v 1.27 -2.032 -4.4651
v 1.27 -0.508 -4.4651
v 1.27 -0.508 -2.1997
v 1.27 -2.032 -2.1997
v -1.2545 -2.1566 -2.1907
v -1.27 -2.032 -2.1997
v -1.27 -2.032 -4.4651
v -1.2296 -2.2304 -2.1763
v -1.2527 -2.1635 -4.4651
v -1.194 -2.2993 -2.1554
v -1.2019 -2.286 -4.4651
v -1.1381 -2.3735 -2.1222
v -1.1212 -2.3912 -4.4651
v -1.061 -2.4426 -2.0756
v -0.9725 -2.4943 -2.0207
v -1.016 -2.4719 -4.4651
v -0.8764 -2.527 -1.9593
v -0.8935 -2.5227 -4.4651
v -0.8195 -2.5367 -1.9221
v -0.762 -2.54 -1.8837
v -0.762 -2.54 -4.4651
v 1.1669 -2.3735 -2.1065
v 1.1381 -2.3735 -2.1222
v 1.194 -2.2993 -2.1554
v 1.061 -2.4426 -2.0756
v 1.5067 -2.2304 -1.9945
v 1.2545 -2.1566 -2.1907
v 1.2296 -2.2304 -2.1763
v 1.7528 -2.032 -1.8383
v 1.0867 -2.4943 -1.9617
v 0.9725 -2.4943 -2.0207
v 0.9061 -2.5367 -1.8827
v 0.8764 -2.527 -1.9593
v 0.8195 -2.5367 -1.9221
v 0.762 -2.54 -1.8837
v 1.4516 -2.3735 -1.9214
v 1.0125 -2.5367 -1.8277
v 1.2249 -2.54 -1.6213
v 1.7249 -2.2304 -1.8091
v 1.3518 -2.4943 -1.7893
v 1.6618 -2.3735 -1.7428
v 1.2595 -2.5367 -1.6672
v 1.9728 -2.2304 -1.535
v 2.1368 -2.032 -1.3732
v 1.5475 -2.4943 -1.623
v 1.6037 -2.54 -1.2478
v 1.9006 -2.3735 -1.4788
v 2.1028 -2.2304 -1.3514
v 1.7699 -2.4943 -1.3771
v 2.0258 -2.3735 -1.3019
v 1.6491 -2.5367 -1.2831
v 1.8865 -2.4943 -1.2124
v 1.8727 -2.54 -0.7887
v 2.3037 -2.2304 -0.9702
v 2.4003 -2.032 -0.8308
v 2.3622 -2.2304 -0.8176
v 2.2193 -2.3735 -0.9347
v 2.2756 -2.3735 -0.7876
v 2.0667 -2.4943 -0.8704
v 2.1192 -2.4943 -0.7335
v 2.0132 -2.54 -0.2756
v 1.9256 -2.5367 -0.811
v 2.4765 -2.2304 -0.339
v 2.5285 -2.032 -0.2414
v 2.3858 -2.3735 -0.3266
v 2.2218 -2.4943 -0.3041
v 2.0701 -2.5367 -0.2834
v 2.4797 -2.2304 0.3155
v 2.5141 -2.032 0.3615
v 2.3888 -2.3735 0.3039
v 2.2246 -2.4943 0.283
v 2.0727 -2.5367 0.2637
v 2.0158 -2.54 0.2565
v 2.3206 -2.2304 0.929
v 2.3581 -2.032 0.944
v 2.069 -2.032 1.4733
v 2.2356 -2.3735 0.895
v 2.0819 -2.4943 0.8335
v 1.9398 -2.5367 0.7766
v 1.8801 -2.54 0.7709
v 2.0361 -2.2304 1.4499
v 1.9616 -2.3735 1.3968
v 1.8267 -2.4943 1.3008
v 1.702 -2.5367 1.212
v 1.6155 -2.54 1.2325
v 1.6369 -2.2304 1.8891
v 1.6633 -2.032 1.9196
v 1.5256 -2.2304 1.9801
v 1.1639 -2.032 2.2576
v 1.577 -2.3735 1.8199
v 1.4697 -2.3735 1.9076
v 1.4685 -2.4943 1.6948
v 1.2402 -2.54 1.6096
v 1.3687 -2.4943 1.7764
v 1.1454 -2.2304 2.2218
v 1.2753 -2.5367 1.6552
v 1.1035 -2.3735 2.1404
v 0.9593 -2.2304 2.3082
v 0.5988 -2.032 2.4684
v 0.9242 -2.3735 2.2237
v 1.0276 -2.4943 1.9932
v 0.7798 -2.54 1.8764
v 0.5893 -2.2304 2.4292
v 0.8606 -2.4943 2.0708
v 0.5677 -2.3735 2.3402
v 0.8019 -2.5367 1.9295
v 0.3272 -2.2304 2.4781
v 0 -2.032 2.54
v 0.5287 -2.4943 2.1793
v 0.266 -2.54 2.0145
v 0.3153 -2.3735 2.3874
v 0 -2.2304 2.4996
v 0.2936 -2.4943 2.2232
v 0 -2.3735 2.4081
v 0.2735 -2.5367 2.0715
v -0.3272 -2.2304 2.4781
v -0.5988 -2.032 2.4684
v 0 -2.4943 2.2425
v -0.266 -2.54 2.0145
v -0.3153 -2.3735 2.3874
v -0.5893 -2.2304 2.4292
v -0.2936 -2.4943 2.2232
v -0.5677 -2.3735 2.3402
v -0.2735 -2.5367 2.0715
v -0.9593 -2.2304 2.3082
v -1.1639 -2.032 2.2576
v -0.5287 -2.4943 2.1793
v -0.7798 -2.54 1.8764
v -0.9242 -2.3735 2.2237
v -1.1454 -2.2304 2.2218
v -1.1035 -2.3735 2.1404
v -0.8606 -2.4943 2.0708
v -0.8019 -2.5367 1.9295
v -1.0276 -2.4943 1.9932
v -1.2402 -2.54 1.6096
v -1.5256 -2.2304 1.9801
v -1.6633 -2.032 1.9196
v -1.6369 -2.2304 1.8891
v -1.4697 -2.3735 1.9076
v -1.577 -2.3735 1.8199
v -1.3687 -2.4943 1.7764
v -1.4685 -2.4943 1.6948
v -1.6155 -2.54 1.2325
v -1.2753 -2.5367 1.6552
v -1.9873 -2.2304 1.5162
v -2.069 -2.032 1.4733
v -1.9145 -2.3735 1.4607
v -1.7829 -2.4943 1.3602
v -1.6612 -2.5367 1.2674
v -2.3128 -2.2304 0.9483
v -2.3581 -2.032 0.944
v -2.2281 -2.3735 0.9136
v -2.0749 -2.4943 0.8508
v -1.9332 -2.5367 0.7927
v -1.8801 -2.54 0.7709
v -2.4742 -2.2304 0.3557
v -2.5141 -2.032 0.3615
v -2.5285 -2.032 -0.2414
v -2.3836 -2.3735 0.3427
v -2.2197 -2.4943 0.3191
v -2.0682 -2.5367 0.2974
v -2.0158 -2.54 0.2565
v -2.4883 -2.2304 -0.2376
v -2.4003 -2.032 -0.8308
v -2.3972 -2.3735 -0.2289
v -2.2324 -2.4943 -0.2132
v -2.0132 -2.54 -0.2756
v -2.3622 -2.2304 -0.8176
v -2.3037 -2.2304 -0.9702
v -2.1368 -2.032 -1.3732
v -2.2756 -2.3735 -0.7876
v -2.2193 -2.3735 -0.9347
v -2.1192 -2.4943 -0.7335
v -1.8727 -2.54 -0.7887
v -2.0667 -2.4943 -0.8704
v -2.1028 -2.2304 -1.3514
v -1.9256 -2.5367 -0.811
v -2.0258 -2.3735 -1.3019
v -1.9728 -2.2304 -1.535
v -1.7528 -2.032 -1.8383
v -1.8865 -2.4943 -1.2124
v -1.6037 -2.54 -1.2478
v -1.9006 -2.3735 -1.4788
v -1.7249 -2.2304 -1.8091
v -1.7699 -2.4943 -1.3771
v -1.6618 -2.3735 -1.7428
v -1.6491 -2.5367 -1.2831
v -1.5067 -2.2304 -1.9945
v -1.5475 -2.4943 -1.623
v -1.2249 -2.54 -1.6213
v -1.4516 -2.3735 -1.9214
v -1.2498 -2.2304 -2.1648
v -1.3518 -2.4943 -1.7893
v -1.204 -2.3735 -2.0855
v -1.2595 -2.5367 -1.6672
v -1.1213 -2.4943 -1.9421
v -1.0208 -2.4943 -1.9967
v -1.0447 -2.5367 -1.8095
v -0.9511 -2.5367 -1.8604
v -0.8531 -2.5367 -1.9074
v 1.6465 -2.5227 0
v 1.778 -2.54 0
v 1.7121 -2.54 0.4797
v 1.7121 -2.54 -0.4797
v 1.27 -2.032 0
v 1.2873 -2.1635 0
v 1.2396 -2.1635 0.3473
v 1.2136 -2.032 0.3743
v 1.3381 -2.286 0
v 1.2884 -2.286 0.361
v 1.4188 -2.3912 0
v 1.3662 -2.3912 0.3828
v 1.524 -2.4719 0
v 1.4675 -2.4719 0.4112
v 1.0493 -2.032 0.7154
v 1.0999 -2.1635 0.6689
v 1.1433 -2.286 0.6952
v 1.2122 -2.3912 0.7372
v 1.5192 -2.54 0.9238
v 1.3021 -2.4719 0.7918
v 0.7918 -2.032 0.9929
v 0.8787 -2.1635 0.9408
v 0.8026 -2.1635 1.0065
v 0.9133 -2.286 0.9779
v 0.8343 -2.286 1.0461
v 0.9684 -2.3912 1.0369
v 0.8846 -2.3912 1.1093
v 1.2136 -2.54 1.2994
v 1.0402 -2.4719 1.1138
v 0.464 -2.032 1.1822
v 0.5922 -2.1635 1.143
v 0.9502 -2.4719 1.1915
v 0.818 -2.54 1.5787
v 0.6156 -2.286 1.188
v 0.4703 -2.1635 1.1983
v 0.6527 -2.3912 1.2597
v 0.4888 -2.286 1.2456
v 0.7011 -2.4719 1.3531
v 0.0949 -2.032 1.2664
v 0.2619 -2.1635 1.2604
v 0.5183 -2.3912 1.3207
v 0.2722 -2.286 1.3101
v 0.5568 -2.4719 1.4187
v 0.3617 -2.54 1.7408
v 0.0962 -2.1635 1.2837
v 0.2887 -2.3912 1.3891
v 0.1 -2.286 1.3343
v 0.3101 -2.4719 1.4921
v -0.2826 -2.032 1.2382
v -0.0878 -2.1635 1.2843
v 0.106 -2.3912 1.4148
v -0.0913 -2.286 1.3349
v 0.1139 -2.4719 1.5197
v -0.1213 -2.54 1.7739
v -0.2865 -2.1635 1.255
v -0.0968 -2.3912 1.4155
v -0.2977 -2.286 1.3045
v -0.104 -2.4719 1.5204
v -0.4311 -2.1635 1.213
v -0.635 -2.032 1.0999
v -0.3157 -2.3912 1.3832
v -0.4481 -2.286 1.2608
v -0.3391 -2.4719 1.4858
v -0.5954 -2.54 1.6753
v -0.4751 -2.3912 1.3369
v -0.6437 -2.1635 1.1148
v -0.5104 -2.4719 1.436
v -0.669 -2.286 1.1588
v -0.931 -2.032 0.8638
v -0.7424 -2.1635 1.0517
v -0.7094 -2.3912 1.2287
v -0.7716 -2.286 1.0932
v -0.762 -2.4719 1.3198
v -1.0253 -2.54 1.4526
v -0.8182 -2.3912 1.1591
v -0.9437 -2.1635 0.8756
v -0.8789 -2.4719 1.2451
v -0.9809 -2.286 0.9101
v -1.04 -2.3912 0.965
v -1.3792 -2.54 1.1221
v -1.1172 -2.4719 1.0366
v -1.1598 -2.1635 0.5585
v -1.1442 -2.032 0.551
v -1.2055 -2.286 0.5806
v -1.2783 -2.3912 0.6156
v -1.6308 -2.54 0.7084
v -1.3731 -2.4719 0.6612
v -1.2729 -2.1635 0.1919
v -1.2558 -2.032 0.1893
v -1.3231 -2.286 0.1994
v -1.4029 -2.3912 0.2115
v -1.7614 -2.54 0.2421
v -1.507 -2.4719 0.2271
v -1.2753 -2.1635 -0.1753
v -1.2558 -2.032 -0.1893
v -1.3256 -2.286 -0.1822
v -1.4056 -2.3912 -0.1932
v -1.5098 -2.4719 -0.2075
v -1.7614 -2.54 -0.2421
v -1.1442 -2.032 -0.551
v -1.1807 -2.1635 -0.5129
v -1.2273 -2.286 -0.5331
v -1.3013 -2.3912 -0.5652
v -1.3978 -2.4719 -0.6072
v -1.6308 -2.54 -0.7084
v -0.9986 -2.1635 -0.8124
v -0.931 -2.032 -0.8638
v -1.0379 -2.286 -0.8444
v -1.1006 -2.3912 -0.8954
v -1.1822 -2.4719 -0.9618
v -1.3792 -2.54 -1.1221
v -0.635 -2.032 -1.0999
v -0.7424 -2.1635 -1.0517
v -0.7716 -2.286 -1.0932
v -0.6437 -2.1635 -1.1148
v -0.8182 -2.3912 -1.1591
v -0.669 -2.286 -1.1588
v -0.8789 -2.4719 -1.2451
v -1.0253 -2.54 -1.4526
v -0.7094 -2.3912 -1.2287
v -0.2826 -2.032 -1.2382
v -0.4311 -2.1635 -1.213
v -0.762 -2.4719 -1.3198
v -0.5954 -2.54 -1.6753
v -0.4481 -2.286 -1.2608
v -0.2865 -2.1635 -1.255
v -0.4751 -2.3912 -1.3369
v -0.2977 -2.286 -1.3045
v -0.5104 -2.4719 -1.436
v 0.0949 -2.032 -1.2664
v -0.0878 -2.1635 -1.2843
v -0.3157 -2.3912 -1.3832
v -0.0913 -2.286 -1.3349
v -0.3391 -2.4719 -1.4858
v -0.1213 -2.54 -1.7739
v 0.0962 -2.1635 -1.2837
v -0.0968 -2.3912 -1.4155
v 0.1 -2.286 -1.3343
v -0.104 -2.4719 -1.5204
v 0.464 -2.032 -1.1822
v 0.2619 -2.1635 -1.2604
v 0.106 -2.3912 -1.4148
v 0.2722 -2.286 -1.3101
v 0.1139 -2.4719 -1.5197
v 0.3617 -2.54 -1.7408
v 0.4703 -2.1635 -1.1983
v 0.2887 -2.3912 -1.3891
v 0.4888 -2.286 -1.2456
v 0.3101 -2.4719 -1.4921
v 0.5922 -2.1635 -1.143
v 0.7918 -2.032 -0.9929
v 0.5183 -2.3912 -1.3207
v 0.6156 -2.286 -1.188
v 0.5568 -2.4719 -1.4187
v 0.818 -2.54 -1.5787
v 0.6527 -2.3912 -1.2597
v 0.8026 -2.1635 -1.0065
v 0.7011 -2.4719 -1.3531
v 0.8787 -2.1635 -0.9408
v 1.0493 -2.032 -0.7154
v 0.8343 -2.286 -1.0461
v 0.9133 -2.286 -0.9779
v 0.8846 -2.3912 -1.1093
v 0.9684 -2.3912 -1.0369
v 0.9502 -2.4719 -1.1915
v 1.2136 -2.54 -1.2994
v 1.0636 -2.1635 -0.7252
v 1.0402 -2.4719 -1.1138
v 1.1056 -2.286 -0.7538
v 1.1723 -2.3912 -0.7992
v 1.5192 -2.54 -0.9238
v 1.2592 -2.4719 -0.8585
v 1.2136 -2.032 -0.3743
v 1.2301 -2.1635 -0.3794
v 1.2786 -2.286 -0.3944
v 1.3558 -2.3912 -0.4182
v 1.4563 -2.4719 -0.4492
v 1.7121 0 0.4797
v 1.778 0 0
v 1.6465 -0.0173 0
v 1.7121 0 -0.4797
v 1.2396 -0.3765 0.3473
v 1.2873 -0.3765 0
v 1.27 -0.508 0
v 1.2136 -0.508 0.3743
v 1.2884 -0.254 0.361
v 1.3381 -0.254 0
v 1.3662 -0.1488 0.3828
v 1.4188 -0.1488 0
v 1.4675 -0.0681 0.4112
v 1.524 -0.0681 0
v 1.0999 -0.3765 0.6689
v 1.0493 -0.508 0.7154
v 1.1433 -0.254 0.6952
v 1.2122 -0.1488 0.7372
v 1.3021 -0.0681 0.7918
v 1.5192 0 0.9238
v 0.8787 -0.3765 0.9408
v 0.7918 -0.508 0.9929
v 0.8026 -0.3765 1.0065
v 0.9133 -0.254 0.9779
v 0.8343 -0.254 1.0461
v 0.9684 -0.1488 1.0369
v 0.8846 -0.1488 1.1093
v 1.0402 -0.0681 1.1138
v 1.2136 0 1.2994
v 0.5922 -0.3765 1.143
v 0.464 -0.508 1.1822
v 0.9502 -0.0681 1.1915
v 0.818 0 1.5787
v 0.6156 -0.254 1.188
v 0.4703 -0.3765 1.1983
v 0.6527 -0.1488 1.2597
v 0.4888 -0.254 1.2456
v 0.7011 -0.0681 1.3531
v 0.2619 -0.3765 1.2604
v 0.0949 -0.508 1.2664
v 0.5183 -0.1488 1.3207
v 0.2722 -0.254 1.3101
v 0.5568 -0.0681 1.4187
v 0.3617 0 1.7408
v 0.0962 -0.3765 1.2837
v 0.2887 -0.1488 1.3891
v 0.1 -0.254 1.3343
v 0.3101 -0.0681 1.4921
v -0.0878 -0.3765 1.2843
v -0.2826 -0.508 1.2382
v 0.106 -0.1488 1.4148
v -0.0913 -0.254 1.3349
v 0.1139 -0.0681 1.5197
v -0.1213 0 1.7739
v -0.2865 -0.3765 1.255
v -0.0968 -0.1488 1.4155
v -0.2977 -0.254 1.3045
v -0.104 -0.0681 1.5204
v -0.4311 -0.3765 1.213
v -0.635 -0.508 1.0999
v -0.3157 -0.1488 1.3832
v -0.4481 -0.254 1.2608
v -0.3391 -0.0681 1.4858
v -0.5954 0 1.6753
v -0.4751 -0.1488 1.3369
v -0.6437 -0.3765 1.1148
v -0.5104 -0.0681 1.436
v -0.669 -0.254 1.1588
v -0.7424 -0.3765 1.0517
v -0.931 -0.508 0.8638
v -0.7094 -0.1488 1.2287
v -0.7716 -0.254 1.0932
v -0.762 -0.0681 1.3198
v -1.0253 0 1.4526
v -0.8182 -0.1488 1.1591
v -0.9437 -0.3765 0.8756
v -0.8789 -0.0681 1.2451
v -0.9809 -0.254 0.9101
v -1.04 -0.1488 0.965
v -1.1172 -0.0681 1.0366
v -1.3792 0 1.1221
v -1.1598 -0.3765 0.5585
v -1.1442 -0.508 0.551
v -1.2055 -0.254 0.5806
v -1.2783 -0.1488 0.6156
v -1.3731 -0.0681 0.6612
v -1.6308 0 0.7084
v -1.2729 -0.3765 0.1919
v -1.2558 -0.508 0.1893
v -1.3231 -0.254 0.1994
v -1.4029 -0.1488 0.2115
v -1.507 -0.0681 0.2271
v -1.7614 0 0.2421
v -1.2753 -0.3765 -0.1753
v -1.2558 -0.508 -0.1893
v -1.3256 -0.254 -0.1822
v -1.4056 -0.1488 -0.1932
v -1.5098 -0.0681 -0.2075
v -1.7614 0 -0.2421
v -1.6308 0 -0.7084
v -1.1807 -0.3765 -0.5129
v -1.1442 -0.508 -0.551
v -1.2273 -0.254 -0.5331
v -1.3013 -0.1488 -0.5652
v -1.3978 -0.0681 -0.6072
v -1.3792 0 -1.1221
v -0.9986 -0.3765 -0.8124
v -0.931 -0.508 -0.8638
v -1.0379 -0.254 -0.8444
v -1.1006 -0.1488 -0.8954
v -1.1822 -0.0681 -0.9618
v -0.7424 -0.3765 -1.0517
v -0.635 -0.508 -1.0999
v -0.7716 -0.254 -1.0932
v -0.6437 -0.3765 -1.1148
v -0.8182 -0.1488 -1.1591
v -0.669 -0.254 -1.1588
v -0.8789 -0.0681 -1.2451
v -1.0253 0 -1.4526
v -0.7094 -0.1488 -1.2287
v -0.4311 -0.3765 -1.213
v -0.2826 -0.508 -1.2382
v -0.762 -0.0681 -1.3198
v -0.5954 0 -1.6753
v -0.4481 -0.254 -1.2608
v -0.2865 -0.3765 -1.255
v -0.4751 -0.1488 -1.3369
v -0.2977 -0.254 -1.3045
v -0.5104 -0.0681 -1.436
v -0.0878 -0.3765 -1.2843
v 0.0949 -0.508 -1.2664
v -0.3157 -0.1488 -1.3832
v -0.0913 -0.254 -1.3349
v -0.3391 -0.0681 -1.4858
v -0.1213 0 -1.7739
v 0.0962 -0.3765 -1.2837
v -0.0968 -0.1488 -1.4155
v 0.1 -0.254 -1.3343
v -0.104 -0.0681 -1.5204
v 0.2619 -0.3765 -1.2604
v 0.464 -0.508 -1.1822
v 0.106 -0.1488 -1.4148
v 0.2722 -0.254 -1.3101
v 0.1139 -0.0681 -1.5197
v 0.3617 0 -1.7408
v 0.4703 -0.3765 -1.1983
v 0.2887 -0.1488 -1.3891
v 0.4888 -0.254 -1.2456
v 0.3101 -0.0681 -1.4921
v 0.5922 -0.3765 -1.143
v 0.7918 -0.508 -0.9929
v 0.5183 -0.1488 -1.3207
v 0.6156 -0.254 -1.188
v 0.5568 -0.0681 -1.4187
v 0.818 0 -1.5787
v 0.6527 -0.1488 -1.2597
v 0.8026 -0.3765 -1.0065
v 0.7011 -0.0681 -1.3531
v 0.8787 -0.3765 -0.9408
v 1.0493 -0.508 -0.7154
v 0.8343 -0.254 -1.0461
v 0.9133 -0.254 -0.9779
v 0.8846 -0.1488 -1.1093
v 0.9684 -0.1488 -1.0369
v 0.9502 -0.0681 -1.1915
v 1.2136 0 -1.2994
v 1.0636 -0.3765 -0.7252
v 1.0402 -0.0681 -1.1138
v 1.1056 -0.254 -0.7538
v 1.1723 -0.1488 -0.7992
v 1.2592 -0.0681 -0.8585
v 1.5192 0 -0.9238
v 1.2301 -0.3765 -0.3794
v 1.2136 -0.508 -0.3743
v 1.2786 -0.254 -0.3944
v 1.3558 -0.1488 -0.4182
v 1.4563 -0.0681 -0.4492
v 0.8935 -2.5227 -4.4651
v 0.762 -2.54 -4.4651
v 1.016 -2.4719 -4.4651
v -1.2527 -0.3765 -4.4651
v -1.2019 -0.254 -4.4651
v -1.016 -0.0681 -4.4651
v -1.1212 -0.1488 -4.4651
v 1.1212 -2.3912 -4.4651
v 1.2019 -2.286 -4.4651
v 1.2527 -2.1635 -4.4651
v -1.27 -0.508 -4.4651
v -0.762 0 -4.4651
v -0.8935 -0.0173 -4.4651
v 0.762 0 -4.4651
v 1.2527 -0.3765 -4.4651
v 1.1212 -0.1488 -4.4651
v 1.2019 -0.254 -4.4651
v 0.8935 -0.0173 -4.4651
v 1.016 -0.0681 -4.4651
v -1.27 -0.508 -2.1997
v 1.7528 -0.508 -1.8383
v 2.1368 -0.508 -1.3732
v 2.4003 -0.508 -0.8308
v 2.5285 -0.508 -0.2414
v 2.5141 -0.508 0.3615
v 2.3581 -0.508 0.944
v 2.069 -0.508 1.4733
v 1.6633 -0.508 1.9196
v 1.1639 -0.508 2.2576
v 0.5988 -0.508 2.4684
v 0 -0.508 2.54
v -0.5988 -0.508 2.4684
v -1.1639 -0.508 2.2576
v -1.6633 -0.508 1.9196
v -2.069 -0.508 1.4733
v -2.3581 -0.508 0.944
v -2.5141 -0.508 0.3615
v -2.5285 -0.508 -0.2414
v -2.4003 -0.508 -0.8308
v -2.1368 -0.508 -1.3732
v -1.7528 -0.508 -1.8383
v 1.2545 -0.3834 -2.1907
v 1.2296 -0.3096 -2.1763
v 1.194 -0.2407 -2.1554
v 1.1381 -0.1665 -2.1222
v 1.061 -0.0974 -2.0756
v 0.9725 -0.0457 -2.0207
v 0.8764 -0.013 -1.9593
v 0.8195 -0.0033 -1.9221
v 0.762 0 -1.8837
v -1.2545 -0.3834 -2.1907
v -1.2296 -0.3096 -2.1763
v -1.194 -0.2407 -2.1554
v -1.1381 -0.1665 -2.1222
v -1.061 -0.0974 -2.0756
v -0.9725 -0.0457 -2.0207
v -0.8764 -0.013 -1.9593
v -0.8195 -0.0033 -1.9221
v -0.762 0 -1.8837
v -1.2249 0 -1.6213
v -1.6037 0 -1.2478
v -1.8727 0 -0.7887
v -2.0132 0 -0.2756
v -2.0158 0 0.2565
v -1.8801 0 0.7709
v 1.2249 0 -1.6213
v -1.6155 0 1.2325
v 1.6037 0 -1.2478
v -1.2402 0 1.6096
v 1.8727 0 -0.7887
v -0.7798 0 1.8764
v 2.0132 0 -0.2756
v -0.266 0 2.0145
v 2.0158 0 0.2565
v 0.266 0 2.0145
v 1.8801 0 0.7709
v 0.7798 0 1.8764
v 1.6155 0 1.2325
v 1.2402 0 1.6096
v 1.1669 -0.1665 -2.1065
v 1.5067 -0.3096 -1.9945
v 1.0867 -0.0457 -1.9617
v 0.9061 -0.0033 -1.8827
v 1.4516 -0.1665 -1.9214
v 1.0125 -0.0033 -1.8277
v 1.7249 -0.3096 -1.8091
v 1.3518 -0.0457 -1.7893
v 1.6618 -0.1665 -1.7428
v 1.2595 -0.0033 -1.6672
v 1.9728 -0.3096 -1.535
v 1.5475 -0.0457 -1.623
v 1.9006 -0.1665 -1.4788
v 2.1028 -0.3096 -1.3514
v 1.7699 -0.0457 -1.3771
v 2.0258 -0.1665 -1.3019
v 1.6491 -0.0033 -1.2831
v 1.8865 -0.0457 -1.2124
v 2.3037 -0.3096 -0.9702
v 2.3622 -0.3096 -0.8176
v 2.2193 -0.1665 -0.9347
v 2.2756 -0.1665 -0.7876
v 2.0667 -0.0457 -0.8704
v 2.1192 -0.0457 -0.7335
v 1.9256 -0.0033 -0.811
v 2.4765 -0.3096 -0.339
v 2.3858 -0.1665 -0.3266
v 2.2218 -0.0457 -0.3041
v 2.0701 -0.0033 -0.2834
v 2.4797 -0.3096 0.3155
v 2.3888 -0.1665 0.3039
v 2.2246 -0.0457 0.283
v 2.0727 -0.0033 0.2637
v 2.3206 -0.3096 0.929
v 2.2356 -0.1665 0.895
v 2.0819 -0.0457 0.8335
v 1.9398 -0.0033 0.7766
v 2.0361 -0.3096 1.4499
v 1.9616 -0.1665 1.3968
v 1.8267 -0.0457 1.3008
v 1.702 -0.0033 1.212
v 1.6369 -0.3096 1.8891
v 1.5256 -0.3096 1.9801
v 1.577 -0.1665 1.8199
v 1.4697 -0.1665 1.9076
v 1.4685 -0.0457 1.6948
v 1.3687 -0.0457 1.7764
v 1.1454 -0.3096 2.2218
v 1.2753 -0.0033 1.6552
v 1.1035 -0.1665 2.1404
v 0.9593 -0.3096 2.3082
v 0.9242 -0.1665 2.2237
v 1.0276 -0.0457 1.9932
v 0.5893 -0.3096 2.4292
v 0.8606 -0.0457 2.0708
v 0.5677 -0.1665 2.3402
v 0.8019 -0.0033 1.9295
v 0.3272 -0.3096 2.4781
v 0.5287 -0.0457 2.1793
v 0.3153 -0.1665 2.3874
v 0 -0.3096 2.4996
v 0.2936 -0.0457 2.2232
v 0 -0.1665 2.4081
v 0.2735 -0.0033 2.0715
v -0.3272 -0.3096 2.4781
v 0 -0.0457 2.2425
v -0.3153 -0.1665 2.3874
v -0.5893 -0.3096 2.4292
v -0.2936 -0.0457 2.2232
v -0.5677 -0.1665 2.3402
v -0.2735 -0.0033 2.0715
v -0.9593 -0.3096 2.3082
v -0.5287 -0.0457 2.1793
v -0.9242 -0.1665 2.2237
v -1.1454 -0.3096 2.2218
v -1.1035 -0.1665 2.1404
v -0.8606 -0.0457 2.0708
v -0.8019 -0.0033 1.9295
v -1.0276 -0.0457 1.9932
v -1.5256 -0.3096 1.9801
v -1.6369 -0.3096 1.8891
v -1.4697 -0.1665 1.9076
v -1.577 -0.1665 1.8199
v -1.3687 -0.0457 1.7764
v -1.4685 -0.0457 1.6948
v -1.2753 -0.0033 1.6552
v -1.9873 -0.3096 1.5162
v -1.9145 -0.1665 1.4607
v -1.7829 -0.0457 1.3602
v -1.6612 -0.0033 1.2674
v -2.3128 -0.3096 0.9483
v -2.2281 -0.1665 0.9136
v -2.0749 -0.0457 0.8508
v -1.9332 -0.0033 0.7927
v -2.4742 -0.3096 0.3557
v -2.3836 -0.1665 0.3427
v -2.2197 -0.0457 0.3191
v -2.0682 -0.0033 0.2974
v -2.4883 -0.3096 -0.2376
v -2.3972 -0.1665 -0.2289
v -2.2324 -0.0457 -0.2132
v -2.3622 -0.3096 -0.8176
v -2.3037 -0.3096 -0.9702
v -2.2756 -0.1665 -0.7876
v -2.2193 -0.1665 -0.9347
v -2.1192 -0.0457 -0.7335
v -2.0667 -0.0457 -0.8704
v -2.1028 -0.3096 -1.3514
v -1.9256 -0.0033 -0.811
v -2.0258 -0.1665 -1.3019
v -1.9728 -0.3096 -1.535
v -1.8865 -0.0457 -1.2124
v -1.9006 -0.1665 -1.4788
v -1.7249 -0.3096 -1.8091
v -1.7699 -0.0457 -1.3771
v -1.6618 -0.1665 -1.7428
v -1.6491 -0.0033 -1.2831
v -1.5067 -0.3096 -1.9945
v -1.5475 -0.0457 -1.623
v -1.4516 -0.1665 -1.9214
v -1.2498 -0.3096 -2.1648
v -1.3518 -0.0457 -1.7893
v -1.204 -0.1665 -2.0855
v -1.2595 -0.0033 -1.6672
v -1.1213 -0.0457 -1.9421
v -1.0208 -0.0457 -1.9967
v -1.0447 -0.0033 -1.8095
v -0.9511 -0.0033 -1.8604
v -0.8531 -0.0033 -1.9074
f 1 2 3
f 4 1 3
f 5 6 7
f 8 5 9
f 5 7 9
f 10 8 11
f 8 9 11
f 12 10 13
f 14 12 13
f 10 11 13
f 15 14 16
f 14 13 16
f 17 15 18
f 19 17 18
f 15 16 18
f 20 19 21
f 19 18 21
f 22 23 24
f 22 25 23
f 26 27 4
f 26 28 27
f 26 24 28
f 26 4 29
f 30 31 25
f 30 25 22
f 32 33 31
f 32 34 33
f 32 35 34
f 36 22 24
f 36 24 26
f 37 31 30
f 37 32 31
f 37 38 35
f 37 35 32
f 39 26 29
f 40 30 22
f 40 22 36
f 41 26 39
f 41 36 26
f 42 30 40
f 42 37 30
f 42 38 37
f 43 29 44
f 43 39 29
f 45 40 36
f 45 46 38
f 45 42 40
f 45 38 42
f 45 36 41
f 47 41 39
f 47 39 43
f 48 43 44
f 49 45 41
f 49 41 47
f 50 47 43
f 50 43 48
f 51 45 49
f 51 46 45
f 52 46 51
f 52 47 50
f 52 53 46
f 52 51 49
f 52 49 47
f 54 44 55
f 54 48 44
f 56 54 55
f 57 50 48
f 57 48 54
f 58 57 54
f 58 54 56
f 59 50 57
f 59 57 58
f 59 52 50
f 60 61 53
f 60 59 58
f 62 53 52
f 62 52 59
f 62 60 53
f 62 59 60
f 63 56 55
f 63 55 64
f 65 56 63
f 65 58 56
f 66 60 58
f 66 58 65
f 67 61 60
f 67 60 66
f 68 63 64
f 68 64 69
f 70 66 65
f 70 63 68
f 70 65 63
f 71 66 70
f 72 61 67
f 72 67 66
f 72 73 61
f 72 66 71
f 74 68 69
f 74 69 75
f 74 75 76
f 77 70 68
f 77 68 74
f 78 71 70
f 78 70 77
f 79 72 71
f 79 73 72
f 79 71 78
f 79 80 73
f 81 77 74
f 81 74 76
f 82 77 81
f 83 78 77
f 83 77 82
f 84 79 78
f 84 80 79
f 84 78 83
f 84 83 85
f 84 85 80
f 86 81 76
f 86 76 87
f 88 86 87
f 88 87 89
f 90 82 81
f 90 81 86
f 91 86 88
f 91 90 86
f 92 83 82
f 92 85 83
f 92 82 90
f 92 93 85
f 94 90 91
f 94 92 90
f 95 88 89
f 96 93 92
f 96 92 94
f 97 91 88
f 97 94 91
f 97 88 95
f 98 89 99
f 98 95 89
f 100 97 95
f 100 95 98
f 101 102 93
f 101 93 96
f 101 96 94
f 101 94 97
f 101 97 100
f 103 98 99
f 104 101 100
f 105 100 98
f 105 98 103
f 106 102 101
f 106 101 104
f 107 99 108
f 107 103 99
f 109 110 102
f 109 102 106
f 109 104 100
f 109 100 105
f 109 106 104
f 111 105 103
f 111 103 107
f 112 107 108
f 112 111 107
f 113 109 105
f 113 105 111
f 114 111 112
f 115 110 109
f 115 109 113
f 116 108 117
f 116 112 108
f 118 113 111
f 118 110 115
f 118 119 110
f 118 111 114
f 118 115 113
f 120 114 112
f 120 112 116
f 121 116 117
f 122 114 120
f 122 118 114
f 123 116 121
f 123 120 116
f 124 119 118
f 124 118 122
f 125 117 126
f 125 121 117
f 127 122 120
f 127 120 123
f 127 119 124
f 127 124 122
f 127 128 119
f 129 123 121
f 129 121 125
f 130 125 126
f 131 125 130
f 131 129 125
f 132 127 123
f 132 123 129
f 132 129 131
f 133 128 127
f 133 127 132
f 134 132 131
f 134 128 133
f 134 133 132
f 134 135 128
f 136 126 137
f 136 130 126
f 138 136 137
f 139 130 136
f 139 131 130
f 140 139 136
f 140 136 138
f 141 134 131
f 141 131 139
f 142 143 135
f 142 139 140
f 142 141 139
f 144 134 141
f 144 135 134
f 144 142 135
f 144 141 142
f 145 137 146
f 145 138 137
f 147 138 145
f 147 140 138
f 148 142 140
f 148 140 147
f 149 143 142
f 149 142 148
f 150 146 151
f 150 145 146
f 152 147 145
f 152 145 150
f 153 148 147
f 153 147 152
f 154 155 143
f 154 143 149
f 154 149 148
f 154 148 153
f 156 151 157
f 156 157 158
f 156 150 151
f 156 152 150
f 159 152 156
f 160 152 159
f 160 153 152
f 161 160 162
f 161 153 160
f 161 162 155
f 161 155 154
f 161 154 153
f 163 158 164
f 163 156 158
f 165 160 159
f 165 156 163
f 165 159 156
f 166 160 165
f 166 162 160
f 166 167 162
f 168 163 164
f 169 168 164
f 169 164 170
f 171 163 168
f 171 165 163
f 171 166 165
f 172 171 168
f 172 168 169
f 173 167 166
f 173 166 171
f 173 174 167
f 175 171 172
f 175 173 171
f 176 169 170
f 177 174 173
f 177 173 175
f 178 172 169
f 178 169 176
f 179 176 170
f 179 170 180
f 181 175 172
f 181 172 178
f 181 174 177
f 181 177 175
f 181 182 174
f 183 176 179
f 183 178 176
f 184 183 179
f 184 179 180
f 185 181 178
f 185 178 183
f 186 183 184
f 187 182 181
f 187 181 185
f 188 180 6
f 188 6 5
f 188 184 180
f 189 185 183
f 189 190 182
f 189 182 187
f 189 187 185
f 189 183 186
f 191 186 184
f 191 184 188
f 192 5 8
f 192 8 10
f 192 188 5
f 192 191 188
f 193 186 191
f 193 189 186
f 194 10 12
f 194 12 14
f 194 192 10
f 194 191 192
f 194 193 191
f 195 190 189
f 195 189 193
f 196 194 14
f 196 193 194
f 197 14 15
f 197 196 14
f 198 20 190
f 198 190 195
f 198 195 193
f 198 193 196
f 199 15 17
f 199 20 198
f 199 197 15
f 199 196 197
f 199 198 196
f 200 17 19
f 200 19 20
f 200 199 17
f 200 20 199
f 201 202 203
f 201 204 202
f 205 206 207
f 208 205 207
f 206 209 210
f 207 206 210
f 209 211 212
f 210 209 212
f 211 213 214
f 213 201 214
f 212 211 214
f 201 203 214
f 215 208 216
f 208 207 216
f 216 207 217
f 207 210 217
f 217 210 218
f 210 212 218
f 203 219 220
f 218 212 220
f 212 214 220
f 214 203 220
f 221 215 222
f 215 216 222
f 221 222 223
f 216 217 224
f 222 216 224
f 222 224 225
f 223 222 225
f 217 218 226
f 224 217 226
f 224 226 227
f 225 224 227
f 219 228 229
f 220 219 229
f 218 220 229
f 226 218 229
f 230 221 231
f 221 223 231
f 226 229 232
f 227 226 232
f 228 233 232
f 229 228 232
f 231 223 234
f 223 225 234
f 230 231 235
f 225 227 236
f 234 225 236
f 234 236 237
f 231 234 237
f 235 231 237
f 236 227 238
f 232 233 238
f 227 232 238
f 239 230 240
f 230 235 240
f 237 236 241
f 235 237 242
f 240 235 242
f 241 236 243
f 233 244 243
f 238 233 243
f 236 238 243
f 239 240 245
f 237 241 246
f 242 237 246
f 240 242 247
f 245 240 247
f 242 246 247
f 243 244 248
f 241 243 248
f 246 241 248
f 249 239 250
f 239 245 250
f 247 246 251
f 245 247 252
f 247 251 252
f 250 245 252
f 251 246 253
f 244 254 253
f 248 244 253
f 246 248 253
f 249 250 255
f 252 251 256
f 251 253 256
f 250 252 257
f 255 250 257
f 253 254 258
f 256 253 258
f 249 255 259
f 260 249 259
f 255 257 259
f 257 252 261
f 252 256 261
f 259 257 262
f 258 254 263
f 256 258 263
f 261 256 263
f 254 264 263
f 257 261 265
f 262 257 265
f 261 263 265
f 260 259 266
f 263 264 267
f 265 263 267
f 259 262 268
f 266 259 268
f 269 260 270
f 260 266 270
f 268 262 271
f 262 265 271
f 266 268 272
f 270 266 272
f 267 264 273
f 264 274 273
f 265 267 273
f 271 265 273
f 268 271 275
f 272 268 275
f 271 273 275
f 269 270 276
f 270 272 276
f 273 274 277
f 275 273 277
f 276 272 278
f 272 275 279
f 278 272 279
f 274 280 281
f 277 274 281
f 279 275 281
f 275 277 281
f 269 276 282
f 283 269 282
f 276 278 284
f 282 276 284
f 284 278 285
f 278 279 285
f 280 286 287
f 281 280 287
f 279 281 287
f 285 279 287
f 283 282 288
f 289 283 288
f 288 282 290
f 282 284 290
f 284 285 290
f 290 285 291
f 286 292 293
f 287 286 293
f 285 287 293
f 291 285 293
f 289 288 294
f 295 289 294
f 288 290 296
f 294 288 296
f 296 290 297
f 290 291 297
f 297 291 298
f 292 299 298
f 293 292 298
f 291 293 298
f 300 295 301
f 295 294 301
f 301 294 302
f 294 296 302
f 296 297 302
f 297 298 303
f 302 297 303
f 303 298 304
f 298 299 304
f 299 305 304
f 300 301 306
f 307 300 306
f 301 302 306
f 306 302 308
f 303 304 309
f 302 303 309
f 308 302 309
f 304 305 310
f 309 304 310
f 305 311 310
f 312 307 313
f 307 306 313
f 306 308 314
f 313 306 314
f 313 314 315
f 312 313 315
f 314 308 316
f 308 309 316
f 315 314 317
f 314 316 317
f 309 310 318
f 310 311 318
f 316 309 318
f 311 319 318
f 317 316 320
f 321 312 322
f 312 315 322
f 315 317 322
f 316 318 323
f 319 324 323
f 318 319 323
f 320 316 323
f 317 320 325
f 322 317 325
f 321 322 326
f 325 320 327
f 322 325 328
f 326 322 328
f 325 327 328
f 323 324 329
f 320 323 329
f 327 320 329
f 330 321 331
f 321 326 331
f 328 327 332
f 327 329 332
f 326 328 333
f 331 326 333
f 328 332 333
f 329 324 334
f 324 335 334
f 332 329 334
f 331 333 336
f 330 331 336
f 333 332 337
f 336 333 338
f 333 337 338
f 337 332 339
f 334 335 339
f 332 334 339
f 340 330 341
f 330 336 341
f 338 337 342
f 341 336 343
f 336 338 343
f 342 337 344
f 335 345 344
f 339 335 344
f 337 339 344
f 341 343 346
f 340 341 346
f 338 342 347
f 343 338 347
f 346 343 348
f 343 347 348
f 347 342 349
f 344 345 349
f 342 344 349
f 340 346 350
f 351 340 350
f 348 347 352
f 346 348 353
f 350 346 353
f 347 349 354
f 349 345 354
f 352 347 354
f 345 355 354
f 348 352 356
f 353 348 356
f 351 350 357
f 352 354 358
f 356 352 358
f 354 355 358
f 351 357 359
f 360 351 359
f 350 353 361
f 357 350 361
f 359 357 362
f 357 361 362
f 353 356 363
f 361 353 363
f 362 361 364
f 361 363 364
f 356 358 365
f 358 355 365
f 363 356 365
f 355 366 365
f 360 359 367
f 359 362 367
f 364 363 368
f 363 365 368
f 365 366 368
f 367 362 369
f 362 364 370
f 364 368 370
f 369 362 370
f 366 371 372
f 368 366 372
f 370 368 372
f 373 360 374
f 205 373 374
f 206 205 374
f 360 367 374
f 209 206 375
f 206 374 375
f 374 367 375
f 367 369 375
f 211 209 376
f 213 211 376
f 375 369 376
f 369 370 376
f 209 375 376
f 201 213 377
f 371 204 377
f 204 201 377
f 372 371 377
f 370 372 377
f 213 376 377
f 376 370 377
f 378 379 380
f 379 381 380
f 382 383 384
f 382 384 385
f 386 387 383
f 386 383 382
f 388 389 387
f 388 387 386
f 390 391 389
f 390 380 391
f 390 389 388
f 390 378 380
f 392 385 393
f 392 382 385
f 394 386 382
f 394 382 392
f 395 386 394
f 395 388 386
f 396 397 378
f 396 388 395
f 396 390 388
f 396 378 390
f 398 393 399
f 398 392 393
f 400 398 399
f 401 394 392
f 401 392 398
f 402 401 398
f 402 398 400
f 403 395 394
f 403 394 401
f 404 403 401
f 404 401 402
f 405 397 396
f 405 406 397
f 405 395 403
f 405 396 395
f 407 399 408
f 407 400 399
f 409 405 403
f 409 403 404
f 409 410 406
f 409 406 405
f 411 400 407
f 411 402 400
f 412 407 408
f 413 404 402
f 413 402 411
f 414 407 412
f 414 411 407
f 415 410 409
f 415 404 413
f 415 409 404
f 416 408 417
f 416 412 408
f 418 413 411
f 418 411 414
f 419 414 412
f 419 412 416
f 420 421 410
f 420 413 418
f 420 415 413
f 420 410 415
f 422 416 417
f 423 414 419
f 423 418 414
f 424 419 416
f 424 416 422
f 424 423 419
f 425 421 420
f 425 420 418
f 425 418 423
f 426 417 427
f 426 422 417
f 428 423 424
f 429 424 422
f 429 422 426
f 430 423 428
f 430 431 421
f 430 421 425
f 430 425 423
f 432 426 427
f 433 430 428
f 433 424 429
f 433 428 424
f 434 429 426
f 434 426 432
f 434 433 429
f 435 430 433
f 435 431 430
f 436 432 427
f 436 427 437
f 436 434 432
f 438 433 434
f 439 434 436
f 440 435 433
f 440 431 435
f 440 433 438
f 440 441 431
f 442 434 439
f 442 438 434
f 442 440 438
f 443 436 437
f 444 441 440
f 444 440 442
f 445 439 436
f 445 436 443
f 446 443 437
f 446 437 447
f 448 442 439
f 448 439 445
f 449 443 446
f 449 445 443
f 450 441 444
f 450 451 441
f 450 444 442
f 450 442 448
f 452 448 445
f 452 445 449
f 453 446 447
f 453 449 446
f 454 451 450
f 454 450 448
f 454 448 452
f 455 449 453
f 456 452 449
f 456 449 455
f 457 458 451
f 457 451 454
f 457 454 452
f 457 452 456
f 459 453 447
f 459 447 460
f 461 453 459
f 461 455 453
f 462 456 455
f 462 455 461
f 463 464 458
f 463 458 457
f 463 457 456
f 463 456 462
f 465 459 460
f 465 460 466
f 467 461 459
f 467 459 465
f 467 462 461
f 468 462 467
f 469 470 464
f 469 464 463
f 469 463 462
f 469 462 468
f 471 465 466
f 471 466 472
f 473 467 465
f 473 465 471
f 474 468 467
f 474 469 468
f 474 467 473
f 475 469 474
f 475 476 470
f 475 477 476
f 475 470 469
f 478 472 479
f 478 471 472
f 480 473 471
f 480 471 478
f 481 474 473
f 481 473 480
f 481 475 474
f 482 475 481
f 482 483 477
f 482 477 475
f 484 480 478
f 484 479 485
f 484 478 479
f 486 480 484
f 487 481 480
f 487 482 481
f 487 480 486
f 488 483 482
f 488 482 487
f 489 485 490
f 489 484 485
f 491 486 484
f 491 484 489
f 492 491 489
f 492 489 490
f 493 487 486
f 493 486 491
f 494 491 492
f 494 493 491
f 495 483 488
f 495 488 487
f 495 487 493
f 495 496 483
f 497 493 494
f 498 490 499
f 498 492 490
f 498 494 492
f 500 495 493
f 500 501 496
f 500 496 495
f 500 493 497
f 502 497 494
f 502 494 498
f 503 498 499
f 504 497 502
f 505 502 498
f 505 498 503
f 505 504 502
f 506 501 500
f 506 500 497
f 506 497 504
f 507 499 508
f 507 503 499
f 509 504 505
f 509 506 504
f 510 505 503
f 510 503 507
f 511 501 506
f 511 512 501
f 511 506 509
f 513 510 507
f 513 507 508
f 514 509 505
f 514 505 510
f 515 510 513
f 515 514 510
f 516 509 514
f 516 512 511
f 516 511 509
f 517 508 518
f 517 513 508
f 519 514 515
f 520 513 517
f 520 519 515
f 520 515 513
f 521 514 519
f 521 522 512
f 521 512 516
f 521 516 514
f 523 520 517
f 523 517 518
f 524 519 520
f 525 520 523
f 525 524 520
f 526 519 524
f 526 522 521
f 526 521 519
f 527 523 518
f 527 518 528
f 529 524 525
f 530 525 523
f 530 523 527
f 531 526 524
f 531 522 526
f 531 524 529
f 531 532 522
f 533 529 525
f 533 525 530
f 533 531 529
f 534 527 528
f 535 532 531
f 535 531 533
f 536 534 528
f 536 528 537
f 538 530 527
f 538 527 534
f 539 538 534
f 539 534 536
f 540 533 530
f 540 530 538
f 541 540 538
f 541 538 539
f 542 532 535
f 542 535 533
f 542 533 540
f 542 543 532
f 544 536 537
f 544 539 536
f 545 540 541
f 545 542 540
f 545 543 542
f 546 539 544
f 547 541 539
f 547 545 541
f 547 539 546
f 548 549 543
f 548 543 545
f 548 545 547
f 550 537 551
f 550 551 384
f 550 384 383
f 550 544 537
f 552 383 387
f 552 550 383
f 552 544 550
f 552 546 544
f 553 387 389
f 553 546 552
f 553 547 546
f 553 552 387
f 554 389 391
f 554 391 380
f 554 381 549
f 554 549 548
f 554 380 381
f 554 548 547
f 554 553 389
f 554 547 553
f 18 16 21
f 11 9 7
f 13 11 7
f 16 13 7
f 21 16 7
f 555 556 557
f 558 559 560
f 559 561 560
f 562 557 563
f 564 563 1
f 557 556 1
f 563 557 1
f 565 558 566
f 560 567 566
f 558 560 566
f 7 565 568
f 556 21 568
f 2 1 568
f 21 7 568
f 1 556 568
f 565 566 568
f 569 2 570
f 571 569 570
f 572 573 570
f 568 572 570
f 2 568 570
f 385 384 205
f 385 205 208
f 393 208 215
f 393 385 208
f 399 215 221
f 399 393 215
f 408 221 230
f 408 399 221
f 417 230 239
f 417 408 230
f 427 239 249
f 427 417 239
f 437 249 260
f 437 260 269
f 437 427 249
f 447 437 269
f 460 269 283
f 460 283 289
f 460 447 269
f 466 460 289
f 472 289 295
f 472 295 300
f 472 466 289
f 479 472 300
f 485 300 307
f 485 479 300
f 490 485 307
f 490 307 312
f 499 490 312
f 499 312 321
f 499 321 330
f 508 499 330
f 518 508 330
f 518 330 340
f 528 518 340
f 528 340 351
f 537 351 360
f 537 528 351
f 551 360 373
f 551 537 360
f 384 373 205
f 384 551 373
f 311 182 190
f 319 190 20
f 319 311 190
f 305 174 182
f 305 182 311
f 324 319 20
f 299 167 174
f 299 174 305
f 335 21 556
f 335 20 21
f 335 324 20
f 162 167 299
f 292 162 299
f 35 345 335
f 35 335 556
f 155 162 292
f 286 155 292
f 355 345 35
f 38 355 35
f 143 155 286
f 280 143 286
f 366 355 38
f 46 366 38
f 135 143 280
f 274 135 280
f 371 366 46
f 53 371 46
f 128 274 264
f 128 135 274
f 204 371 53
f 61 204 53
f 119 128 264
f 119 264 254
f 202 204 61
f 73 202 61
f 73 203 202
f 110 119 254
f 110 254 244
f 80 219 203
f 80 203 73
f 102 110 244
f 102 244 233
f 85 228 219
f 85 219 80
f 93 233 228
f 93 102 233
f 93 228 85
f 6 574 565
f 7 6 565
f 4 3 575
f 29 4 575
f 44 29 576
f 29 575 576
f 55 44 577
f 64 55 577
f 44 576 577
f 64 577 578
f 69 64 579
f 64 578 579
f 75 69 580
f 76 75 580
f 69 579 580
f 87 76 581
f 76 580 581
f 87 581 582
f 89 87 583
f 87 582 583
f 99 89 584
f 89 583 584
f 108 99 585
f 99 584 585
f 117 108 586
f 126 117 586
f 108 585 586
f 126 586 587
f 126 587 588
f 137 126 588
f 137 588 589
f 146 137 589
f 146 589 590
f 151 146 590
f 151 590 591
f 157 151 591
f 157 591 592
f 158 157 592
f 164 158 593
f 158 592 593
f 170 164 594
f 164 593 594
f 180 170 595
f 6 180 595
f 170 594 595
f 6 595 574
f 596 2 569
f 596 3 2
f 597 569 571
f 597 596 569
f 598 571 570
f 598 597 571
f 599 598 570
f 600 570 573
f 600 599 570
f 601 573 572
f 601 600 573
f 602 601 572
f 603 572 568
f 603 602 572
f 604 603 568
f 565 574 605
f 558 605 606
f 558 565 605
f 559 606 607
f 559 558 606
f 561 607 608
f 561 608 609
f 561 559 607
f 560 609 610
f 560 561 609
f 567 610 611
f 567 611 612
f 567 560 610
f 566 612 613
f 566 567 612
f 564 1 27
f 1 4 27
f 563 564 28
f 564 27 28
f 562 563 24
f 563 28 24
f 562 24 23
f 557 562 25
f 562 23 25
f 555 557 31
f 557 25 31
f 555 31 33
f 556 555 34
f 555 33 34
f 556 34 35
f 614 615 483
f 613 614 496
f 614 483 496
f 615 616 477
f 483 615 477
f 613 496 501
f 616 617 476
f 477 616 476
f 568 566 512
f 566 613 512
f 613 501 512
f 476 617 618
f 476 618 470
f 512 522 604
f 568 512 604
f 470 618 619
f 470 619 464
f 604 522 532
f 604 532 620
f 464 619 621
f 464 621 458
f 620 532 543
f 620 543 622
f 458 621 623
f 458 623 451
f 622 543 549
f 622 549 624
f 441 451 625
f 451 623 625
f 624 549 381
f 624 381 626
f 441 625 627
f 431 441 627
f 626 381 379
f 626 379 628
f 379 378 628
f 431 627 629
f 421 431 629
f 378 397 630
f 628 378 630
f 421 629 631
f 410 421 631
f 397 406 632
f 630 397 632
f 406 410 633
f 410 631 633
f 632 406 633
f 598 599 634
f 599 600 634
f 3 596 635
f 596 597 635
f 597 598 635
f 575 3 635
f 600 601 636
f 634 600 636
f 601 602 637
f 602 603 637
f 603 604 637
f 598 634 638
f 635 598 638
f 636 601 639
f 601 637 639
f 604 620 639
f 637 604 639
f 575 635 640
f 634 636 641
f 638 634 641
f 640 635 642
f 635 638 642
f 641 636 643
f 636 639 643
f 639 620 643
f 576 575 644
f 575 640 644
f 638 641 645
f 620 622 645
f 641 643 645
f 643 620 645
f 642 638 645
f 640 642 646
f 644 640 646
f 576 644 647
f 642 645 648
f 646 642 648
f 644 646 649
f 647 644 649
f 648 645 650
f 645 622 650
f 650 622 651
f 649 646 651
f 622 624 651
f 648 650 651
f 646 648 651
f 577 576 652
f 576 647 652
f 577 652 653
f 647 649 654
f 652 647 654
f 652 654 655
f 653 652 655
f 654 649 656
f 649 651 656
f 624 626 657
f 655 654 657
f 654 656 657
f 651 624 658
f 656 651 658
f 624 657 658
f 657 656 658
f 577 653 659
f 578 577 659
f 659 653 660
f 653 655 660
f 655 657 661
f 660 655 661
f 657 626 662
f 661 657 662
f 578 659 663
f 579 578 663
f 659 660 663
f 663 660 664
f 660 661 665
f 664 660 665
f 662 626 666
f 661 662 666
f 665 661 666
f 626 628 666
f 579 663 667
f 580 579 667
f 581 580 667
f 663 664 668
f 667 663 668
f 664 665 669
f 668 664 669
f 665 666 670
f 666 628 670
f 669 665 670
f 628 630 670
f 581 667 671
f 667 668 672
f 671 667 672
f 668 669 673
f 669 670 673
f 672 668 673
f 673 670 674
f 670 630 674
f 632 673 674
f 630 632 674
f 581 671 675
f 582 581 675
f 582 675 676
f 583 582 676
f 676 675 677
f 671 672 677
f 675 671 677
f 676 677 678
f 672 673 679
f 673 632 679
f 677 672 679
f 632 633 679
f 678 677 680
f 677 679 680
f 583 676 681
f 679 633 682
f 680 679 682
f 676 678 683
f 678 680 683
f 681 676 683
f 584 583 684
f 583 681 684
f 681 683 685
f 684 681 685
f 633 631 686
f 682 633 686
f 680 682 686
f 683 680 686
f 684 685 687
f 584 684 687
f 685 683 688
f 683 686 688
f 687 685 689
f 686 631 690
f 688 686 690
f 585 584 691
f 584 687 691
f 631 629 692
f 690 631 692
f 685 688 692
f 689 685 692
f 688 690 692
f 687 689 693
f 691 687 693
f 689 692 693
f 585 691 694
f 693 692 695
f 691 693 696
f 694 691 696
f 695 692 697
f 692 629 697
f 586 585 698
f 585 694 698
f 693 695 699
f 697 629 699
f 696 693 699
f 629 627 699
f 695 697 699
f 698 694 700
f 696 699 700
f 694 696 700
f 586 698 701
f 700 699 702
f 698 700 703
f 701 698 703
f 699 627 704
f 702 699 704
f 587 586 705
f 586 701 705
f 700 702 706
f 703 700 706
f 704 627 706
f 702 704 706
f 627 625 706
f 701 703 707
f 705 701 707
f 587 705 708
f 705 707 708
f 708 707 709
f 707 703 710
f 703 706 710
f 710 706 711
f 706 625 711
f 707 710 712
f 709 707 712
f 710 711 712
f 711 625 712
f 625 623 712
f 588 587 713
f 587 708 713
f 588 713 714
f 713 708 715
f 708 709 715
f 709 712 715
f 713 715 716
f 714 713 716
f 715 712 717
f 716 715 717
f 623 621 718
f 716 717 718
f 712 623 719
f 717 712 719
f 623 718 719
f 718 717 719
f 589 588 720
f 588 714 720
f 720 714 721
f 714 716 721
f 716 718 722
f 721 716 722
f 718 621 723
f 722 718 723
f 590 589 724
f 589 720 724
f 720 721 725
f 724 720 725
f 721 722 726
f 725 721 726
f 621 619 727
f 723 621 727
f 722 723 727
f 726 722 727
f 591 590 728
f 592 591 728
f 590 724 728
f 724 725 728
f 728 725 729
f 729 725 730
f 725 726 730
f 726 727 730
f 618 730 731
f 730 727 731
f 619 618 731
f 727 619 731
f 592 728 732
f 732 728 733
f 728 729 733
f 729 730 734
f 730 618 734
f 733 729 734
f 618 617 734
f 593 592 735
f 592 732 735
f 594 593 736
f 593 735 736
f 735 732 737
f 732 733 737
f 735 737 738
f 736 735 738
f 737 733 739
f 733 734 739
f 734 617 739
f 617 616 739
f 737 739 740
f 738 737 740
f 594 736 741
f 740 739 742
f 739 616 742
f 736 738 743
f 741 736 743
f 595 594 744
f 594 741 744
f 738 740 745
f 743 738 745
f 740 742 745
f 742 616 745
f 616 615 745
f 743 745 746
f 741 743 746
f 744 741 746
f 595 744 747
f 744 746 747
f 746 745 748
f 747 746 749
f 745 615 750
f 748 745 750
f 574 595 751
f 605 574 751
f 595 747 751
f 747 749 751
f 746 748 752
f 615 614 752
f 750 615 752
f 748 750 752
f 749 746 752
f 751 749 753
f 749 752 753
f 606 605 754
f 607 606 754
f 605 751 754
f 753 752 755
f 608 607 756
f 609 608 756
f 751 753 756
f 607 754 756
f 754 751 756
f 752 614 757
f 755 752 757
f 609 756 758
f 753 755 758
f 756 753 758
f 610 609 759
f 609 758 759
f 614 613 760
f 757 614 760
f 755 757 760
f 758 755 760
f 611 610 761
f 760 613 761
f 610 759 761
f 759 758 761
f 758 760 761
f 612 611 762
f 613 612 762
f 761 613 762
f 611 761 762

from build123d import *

# Parameters (mm, degrees)
F0_R     = 1.27
F1_DEPTH = 2.54
F2_R     = 0.508


with BuildPart() as f1:
    # F0 (on Front) → F1 (new body)
    with BuildSketch(Plane.XZ):
        with BuildLine():
            Line((1.27, -4.465058), (1.27, -2.199705))
            ThreePointArc((1.27, -2.199705), (0, 2.54), (-1.27, -2.199705))
            Line((-1.27, -2.199705), (-1.27, -4.465058))
            Line((-1.27, -4.465058), (1.27, -4.465058))
        make_face()
        Circle(F0_R, mode=Mode.SUBTRACT)
    extrude(amount=F1_DEPTH)

    # F2
    f2_edges = [f1.edges().sort_by_distance(p)[0] for p in [
        (-1.27, -2.54, 0),
        (0, -2.54, 2.54),
        (-1.27, -2.54, -3.332381),
        (1.27, -2.54, -3.332381),
        (-1.27, 0, 0),
        (0, 0, 2.54),
        (-1.27, 0, -3.332381),
        (1.27, 0, -3.332381),
    ]]
    fillet(f2_edges, radius=F2_R)


solid = f1.part
